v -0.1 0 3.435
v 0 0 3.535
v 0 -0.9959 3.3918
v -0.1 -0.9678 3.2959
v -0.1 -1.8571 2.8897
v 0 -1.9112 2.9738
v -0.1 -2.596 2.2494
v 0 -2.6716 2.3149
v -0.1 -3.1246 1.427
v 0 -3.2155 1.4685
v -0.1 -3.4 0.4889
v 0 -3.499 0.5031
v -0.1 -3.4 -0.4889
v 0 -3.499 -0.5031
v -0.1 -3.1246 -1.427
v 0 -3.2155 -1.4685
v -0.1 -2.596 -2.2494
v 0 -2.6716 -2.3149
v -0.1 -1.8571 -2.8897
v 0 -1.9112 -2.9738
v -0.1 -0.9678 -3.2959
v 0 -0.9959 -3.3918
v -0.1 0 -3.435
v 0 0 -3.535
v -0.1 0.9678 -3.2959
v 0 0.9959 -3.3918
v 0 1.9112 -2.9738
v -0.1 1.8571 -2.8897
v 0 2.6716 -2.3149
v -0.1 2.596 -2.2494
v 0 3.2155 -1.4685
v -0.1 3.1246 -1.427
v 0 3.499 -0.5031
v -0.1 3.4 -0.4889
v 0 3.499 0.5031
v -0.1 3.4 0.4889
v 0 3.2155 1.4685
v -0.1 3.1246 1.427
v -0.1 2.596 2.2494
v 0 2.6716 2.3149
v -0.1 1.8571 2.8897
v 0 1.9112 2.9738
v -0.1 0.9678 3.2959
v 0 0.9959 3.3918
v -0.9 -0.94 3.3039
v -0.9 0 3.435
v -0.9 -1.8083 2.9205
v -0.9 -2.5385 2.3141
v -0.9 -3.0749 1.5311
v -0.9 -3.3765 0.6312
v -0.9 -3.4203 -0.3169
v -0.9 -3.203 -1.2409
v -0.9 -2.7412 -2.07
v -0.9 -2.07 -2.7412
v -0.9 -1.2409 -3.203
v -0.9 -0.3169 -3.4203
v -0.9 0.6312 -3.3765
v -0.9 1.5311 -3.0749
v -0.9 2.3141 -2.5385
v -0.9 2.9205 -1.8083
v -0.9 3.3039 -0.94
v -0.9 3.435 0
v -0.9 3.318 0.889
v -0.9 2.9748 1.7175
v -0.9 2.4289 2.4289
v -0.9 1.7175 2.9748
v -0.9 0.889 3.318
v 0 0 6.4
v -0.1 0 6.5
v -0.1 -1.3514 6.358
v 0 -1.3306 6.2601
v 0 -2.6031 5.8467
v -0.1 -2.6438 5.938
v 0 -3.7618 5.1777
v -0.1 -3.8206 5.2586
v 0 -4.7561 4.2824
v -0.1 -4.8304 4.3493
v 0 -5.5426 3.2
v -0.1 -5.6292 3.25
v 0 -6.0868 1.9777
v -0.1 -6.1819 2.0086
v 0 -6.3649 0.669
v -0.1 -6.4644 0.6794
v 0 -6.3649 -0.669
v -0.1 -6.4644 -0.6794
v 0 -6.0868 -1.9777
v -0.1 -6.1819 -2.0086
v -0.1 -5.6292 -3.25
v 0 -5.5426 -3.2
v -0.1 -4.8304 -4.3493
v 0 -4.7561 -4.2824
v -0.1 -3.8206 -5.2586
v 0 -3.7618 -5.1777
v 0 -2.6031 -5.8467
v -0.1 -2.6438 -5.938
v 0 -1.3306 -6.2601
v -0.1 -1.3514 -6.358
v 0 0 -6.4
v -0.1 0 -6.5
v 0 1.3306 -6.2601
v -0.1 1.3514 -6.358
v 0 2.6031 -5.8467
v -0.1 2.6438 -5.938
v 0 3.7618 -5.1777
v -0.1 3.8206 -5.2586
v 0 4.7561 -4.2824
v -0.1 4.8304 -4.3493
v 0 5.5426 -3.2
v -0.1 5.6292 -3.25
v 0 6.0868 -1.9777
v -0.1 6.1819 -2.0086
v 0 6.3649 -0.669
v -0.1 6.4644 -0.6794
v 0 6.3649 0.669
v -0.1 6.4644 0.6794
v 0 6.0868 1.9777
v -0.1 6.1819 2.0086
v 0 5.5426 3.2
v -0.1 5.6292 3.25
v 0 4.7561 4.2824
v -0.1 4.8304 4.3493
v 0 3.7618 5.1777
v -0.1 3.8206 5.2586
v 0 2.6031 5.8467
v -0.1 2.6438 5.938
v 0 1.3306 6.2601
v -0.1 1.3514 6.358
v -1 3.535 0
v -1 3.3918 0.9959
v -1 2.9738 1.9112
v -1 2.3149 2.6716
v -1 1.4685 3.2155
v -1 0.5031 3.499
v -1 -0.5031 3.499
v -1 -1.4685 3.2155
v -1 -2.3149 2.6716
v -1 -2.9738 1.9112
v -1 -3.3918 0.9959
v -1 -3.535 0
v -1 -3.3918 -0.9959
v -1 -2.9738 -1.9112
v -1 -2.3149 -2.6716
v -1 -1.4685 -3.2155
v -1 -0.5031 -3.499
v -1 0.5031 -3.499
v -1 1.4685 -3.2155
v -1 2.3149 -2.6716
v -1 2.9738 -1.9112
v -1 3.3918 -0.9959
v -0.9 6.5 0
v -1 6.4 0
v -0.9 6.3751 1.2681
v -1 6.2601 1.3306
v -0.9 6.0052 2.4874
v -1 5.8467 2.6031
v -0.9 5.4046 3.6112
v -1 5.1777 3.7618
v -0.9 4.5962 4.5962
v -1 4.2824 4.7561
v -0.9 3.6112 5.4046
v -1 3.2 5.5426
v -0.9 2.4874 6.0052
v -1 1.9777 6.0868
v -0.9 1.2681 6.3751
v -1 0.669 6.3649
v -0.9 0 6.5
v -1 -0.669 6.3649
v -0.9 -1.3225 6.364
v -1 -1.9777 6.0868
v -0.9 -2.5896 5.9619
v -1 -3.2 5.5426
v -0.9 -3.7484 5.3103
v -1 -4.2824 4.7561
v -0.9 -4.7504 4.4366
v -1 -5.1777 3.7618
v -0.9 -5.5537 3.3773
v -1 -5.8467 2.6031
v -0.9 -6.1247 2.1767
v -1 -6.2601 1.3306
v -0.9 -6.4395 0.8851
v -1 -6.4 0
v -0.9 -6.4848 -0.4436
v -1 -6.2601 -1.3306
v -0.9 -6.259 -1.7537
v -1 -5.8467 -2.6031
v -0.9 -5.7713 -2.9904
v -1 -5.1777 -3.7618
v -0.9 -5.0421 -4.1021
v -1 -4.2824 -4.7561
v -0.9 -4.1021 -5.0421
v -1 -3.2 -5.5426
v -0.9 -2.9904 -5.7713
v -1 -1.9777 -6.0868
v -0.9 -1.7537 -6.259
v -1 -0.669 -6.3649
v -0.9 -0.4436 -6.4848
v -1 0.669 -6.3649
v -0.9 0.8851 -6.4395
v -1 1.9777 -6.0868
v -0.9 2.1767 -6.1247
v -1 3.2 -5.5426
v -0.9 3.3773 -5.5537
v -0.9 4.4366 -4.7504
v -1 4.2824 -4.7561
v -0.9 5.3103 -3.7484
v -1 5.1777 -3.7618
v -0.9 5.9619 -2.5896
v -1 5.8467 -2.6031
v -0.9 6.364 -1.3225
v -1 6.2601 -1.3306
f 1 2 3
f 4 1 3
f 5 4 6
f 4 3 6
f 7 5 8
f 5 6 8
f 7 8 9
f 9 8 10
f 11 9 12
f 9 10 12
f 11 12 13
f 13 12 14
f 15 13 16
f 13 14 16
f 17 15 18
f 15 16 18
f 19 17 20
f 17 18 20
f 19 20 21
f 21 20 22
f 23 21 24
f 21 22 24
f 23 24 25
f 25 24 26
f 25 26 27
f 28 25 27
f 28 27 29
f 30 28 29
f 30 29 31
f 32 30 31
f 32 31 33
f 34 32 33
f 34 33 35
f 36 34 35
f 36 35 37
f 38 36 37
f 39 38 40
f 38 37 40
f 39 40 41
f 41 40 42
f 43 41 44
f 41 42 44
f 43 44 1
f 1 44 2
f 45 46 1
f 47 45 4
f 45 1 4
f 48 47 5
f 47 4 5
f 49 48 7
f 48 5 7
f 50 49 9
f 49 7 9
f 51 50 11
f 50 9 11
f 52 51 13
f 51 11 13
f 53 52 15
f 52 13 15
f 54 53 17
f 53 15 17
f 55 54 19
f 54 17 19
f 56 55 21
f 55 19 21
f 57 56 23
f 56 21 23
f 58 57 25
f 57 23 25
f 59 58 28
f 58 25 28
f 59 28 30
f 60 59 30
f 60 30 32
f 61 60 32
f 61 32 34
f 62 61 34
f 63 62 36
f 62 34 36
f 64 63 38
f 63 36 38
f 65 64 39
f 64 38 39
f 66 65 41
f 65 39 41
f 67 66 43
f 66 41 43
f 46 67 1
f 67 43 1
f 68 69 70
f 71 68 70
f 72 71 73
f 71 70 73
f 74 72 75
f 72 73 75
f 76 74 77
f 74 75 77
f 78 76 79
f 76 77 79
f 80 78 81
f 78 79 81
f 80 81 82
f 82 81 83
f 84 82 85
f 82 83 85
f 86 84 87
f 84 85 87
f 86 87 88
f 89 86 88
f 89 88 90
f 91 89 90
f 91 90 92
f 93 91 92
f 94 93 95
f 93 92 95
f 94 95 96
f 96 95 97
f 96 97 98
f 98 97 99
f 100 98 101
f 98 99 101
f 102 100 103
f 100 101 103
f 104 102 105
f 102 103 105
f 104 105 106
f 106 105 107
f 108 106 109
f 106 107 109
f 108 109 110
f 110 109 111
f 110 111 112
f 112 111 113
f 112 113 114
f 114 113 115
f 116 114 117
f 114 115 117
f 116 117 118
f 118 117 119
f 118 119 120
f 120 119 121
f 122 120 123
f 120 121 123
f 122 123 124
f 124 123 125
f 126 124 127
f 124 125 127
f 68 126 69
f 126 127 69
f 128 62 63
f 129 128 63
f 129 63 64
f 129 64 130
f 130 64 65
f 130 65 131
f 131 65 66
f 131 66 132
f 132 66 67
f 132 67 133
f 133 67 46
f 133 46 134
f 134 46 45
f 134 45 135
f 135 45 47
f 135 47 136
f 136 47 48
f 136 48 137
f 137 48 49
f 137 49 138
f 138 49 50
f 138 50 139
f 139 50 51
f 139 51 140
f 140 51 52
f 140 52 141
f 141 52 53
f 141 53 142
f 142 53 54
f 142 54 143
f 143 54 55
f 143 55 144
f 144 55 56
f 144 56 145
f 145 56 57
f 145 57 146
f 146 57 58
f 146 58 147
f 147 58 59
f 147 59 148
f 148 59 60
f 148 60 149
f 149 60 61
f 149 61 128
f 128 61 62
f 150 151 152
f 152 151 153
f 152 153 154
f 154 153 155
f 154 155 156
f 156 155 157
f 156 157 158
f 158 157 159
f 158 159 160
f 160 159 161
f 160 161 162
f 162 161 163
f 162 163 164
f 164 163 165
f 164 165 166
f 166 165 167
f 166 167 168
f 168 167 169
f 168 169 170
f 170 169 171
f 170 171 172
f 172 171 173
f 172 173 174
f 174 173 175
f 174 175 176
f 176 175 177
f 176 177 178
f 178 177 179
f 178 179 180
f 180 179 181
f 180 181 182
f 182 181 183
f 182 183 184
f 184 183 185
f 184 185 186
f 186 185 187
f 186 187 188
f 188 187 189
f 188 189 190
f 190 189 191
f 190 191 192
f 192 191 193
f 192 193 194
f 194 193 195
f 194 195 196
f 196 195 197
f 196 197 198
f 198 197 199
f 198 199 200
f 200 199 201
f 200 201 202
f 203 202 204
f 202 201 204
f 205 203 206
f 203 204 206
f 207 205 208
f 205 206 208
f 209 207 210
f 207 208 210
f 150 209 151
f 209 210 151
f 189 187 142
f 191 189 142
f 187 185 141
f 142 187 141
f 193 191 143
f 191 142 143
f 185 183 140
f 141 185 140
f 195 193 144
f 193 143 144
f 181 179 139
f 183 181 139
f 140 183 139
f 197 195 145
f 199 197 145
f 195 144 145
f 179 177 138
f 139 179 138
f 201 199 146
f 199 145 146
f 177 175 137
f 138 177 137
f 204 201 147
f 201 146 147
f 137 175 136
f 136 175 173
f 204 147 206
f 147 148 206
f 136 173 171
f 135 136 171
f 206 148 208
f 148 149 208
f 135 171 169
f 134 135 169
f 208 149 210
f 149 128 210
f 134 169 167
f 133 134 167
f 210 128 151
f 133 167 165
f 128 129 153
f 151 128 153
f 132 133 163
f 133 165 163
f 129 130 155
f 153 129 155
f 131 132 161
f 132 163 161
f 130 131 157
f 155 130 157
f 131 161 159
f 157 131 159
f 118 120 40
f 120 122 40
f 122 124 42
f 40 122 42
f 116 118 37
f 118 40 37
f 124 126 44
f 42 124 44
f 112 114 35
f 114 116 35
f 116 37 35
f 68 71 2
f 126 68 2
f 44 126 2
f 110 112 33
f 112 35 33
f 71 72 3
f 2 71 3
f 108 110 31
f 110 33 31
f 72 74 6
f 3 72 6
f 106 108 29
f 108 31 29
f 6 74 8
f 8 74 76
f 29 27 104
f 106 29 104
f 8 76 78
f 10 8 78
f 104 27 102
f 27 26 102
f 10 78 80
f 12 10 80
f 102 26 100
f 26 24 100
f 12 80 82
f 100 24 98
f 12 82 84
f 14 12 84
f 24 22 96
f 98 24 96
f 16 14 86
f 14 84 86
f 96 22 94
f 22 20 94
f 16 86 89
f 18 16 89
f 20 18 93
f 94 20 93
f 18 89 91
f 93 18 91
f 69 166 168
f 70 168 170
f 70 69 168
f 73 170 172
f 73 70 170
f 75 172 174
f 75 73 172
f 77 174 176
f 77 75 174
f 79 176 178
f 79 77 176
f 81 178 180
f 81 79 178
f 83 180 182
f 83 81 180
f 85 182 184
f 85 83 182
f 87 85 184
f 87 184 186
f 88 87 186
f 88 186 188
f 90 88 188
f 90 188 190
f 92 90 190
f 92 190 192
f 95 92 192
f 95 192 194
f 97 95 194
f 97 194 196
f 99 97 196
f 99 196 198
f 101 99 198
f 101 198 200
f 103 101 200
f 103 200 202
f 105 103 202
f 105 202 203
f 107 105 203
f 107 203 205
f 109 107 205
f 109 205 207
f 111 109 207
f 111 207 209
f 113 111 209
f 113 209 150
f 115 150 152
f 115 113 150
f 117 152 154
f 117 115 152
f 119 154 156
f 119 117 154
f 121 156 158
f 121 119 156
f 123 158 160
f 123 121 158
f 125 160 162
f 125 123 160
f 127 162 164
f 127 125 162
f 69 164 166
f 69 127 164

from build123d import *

# Parameters (mm, degrees)
SKETCH1_W     = 1.75
SKETCH1_H     = 3.065
CHAMFER1_SIZE = 0.1


# Read off the part's stored shape, not the designer's step: Move Face1
with BuildPart() as part:
    # Sketch1 → Base-Revolve (revolve)
    with BuildSketch(Plane.XY, mode=Mode.PRIVATE) as base_revolve_sk:
        with Locations((-0.875, 4.9675)):
            Rectangle(SKETCH1_W, SKETCH1_H)
    revolve(base_revolve_sk.sketch.rotate(Axis((-34.925, 0, 0), (1, 0, 0)), 90), axis=Axis((-34.925, 0, 0), (1, 0, 0)))

    # Chamfer1
    chamfer1_edges = [part.edges().sort_by_distance(p)[0] for p in [
        (-1.75, 0, -3.435),
        (-1.75, 0, -6.5),
        (0, 0, -6.5),
        (0, 0, -3.435),
    ]]
    chamfer(chamfer1_edges, length=CHAMFER1_SIZE)

    # Move Face1 outline → Move Face1 (revolve, cut)
    with BuildSketch(Plane.YX):
        Polygon((6.4, -1), (3.535, -1), (3.435, -0.9), (3.435, -1.65), (3.535, -1.75), (6.4, -1.75), (6.5, -1.65), (6.5, -0.9), align=None)
    revolve(axis=Axis((0, 0, 0), (1, 0, 0)), mode=Mode.SUBTRACT)


solid = part.part
